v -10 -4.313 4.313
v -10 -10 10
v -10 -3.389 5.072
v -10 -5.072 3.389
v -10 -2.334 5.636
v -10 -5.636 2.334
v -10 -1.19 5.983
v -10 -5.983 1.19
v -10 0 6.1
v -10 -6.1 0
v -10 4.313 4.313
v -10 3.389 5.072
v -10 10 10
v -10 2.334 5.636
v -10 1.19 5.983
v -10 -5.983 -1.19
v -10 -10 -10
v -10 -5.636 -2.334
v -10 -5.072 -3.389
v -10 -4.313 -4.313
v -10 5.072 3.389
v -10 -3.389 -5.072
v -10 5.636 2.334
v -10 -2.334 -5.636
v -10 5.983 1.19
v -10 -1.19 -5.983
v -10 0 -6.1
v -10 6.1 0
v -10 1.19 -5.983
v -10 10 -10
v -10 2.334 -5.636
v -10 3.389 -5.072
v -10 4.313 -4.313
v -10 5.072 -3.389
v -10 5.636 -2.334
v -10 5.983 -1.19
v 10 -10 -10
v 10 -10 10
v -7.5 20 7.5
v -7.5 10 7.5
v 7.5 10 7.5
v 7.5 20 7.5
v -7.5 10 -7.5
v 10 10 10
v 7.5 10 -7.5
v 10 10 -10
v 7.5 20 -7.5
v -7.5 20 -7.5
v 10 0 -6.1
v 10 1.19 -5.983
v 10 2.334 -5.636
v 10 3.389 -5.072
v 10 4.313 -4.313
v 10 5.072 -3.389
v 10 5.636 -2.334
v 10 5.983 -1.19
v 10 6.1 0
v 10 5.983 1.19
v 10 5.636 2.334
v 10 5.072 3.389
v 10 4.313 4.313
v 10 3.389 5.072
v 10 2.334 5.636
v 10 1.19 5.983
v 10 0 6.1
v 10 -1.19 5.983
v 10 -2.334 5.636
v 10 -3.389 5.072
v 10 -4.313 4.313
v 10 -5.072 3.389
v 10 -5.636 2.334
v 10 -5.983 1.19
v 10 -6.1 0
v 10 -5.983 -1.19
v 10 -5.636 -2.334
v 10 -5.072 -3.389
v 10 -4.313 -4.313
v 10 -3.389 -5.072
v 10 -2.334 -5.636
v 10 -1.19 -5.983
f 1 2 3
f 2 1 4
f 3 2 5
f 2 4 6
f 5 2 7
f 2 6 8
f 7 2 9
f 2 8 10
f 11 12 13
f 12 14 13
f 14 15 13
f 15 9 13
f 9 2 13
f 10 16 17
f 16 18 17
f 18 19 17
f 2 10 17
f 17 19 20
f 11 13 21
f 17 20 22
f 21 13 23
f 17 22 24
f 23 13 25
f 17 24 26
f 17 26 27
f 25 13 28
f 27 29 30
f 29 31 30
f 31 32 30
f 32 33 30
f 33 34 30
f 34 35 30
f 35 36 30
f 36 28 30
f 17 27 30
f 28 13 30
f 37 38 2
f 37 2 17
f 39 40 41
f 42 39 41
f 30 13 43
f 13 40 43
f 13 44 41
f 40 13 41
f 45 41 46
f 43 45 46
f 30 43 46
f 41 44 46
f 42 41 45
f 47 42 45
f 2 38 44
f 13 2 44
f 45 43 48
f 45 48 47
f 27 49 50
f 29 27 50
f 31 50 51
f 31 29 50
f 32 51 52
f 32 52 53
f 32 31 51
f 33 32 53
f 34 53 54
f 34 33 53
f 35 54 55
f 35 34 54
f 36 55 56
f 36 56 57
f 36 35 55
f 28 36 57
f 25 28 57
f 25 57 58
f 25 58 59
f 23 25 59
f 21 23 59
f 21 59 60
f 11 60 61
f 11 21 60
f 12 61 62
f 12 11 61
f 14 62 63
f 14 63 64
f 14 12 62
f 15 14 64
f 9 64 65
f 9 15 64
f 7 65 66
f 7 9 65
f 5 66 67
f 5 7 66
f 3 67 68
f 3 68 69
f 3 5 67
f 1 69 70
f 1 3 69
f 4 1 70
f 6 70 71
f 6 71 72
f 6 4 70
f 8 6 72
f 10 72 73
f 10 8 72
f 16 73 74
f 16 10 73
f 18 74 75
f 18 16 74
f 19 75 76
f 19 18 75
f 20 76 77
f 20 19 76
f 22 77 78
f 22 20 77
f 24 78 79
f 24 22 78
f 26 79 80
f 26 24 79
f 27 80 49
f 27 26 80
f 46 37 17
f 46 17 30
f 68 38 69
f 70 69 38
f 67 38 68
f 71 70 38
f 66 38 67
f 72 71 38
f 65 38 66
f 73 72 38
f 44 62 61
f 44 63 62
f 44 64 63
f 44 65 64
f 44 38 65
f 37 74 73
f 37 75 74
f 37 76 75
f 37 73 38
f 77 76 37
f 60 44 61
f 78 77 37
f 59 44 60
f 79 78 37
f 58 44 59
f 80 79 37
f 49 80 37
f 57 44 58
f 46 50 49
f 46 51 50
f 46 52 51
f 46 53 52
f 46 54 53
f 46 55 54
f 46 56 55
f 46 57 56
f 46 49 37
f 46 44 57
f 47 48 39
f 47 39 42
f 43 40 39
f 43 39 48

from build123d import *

# Parameters (mm, degrees)
SKETCH1_W           = 20
SKETCH1_H           = 20
SKETCH1_R           = 6.1
BOSS_EXTRUDE1_DEPTH = 10
SKETCH3_W           = 15
SKETCH3_H           = 15
BOSS_EXTRUDE2_DEPTH = 10


with BuildPart() as part:
    # Sketch1 → Boss-Extrude1 (new body, symmetric)
    with BuildSketch(Plane(origin=(0, 0, 0), x_dir=(0, 0, -1), z_dir=(1, 0, 0))):
        Rectangle(SKETCH1_W, SKETCH1_H)
        Circle(SKETCH1_R, mode=Mode.SUBTRACT)
    extrude(amount=BOSS_EXTRUDE1_DEPTH, both=True)

    # Sketch3 → Boss-Extrude2 (add)
    with BuildSketch(Plane(origin=(0, 10, 0), x_dir=(1, 0, 0), z_dir=(0, 1, 0))):
        Rectangle(SKETCH3_W, SKETCH3_H)
    extrude(amount=BOSS_EXTRUDE2_DEPTH)


solid = part.part
